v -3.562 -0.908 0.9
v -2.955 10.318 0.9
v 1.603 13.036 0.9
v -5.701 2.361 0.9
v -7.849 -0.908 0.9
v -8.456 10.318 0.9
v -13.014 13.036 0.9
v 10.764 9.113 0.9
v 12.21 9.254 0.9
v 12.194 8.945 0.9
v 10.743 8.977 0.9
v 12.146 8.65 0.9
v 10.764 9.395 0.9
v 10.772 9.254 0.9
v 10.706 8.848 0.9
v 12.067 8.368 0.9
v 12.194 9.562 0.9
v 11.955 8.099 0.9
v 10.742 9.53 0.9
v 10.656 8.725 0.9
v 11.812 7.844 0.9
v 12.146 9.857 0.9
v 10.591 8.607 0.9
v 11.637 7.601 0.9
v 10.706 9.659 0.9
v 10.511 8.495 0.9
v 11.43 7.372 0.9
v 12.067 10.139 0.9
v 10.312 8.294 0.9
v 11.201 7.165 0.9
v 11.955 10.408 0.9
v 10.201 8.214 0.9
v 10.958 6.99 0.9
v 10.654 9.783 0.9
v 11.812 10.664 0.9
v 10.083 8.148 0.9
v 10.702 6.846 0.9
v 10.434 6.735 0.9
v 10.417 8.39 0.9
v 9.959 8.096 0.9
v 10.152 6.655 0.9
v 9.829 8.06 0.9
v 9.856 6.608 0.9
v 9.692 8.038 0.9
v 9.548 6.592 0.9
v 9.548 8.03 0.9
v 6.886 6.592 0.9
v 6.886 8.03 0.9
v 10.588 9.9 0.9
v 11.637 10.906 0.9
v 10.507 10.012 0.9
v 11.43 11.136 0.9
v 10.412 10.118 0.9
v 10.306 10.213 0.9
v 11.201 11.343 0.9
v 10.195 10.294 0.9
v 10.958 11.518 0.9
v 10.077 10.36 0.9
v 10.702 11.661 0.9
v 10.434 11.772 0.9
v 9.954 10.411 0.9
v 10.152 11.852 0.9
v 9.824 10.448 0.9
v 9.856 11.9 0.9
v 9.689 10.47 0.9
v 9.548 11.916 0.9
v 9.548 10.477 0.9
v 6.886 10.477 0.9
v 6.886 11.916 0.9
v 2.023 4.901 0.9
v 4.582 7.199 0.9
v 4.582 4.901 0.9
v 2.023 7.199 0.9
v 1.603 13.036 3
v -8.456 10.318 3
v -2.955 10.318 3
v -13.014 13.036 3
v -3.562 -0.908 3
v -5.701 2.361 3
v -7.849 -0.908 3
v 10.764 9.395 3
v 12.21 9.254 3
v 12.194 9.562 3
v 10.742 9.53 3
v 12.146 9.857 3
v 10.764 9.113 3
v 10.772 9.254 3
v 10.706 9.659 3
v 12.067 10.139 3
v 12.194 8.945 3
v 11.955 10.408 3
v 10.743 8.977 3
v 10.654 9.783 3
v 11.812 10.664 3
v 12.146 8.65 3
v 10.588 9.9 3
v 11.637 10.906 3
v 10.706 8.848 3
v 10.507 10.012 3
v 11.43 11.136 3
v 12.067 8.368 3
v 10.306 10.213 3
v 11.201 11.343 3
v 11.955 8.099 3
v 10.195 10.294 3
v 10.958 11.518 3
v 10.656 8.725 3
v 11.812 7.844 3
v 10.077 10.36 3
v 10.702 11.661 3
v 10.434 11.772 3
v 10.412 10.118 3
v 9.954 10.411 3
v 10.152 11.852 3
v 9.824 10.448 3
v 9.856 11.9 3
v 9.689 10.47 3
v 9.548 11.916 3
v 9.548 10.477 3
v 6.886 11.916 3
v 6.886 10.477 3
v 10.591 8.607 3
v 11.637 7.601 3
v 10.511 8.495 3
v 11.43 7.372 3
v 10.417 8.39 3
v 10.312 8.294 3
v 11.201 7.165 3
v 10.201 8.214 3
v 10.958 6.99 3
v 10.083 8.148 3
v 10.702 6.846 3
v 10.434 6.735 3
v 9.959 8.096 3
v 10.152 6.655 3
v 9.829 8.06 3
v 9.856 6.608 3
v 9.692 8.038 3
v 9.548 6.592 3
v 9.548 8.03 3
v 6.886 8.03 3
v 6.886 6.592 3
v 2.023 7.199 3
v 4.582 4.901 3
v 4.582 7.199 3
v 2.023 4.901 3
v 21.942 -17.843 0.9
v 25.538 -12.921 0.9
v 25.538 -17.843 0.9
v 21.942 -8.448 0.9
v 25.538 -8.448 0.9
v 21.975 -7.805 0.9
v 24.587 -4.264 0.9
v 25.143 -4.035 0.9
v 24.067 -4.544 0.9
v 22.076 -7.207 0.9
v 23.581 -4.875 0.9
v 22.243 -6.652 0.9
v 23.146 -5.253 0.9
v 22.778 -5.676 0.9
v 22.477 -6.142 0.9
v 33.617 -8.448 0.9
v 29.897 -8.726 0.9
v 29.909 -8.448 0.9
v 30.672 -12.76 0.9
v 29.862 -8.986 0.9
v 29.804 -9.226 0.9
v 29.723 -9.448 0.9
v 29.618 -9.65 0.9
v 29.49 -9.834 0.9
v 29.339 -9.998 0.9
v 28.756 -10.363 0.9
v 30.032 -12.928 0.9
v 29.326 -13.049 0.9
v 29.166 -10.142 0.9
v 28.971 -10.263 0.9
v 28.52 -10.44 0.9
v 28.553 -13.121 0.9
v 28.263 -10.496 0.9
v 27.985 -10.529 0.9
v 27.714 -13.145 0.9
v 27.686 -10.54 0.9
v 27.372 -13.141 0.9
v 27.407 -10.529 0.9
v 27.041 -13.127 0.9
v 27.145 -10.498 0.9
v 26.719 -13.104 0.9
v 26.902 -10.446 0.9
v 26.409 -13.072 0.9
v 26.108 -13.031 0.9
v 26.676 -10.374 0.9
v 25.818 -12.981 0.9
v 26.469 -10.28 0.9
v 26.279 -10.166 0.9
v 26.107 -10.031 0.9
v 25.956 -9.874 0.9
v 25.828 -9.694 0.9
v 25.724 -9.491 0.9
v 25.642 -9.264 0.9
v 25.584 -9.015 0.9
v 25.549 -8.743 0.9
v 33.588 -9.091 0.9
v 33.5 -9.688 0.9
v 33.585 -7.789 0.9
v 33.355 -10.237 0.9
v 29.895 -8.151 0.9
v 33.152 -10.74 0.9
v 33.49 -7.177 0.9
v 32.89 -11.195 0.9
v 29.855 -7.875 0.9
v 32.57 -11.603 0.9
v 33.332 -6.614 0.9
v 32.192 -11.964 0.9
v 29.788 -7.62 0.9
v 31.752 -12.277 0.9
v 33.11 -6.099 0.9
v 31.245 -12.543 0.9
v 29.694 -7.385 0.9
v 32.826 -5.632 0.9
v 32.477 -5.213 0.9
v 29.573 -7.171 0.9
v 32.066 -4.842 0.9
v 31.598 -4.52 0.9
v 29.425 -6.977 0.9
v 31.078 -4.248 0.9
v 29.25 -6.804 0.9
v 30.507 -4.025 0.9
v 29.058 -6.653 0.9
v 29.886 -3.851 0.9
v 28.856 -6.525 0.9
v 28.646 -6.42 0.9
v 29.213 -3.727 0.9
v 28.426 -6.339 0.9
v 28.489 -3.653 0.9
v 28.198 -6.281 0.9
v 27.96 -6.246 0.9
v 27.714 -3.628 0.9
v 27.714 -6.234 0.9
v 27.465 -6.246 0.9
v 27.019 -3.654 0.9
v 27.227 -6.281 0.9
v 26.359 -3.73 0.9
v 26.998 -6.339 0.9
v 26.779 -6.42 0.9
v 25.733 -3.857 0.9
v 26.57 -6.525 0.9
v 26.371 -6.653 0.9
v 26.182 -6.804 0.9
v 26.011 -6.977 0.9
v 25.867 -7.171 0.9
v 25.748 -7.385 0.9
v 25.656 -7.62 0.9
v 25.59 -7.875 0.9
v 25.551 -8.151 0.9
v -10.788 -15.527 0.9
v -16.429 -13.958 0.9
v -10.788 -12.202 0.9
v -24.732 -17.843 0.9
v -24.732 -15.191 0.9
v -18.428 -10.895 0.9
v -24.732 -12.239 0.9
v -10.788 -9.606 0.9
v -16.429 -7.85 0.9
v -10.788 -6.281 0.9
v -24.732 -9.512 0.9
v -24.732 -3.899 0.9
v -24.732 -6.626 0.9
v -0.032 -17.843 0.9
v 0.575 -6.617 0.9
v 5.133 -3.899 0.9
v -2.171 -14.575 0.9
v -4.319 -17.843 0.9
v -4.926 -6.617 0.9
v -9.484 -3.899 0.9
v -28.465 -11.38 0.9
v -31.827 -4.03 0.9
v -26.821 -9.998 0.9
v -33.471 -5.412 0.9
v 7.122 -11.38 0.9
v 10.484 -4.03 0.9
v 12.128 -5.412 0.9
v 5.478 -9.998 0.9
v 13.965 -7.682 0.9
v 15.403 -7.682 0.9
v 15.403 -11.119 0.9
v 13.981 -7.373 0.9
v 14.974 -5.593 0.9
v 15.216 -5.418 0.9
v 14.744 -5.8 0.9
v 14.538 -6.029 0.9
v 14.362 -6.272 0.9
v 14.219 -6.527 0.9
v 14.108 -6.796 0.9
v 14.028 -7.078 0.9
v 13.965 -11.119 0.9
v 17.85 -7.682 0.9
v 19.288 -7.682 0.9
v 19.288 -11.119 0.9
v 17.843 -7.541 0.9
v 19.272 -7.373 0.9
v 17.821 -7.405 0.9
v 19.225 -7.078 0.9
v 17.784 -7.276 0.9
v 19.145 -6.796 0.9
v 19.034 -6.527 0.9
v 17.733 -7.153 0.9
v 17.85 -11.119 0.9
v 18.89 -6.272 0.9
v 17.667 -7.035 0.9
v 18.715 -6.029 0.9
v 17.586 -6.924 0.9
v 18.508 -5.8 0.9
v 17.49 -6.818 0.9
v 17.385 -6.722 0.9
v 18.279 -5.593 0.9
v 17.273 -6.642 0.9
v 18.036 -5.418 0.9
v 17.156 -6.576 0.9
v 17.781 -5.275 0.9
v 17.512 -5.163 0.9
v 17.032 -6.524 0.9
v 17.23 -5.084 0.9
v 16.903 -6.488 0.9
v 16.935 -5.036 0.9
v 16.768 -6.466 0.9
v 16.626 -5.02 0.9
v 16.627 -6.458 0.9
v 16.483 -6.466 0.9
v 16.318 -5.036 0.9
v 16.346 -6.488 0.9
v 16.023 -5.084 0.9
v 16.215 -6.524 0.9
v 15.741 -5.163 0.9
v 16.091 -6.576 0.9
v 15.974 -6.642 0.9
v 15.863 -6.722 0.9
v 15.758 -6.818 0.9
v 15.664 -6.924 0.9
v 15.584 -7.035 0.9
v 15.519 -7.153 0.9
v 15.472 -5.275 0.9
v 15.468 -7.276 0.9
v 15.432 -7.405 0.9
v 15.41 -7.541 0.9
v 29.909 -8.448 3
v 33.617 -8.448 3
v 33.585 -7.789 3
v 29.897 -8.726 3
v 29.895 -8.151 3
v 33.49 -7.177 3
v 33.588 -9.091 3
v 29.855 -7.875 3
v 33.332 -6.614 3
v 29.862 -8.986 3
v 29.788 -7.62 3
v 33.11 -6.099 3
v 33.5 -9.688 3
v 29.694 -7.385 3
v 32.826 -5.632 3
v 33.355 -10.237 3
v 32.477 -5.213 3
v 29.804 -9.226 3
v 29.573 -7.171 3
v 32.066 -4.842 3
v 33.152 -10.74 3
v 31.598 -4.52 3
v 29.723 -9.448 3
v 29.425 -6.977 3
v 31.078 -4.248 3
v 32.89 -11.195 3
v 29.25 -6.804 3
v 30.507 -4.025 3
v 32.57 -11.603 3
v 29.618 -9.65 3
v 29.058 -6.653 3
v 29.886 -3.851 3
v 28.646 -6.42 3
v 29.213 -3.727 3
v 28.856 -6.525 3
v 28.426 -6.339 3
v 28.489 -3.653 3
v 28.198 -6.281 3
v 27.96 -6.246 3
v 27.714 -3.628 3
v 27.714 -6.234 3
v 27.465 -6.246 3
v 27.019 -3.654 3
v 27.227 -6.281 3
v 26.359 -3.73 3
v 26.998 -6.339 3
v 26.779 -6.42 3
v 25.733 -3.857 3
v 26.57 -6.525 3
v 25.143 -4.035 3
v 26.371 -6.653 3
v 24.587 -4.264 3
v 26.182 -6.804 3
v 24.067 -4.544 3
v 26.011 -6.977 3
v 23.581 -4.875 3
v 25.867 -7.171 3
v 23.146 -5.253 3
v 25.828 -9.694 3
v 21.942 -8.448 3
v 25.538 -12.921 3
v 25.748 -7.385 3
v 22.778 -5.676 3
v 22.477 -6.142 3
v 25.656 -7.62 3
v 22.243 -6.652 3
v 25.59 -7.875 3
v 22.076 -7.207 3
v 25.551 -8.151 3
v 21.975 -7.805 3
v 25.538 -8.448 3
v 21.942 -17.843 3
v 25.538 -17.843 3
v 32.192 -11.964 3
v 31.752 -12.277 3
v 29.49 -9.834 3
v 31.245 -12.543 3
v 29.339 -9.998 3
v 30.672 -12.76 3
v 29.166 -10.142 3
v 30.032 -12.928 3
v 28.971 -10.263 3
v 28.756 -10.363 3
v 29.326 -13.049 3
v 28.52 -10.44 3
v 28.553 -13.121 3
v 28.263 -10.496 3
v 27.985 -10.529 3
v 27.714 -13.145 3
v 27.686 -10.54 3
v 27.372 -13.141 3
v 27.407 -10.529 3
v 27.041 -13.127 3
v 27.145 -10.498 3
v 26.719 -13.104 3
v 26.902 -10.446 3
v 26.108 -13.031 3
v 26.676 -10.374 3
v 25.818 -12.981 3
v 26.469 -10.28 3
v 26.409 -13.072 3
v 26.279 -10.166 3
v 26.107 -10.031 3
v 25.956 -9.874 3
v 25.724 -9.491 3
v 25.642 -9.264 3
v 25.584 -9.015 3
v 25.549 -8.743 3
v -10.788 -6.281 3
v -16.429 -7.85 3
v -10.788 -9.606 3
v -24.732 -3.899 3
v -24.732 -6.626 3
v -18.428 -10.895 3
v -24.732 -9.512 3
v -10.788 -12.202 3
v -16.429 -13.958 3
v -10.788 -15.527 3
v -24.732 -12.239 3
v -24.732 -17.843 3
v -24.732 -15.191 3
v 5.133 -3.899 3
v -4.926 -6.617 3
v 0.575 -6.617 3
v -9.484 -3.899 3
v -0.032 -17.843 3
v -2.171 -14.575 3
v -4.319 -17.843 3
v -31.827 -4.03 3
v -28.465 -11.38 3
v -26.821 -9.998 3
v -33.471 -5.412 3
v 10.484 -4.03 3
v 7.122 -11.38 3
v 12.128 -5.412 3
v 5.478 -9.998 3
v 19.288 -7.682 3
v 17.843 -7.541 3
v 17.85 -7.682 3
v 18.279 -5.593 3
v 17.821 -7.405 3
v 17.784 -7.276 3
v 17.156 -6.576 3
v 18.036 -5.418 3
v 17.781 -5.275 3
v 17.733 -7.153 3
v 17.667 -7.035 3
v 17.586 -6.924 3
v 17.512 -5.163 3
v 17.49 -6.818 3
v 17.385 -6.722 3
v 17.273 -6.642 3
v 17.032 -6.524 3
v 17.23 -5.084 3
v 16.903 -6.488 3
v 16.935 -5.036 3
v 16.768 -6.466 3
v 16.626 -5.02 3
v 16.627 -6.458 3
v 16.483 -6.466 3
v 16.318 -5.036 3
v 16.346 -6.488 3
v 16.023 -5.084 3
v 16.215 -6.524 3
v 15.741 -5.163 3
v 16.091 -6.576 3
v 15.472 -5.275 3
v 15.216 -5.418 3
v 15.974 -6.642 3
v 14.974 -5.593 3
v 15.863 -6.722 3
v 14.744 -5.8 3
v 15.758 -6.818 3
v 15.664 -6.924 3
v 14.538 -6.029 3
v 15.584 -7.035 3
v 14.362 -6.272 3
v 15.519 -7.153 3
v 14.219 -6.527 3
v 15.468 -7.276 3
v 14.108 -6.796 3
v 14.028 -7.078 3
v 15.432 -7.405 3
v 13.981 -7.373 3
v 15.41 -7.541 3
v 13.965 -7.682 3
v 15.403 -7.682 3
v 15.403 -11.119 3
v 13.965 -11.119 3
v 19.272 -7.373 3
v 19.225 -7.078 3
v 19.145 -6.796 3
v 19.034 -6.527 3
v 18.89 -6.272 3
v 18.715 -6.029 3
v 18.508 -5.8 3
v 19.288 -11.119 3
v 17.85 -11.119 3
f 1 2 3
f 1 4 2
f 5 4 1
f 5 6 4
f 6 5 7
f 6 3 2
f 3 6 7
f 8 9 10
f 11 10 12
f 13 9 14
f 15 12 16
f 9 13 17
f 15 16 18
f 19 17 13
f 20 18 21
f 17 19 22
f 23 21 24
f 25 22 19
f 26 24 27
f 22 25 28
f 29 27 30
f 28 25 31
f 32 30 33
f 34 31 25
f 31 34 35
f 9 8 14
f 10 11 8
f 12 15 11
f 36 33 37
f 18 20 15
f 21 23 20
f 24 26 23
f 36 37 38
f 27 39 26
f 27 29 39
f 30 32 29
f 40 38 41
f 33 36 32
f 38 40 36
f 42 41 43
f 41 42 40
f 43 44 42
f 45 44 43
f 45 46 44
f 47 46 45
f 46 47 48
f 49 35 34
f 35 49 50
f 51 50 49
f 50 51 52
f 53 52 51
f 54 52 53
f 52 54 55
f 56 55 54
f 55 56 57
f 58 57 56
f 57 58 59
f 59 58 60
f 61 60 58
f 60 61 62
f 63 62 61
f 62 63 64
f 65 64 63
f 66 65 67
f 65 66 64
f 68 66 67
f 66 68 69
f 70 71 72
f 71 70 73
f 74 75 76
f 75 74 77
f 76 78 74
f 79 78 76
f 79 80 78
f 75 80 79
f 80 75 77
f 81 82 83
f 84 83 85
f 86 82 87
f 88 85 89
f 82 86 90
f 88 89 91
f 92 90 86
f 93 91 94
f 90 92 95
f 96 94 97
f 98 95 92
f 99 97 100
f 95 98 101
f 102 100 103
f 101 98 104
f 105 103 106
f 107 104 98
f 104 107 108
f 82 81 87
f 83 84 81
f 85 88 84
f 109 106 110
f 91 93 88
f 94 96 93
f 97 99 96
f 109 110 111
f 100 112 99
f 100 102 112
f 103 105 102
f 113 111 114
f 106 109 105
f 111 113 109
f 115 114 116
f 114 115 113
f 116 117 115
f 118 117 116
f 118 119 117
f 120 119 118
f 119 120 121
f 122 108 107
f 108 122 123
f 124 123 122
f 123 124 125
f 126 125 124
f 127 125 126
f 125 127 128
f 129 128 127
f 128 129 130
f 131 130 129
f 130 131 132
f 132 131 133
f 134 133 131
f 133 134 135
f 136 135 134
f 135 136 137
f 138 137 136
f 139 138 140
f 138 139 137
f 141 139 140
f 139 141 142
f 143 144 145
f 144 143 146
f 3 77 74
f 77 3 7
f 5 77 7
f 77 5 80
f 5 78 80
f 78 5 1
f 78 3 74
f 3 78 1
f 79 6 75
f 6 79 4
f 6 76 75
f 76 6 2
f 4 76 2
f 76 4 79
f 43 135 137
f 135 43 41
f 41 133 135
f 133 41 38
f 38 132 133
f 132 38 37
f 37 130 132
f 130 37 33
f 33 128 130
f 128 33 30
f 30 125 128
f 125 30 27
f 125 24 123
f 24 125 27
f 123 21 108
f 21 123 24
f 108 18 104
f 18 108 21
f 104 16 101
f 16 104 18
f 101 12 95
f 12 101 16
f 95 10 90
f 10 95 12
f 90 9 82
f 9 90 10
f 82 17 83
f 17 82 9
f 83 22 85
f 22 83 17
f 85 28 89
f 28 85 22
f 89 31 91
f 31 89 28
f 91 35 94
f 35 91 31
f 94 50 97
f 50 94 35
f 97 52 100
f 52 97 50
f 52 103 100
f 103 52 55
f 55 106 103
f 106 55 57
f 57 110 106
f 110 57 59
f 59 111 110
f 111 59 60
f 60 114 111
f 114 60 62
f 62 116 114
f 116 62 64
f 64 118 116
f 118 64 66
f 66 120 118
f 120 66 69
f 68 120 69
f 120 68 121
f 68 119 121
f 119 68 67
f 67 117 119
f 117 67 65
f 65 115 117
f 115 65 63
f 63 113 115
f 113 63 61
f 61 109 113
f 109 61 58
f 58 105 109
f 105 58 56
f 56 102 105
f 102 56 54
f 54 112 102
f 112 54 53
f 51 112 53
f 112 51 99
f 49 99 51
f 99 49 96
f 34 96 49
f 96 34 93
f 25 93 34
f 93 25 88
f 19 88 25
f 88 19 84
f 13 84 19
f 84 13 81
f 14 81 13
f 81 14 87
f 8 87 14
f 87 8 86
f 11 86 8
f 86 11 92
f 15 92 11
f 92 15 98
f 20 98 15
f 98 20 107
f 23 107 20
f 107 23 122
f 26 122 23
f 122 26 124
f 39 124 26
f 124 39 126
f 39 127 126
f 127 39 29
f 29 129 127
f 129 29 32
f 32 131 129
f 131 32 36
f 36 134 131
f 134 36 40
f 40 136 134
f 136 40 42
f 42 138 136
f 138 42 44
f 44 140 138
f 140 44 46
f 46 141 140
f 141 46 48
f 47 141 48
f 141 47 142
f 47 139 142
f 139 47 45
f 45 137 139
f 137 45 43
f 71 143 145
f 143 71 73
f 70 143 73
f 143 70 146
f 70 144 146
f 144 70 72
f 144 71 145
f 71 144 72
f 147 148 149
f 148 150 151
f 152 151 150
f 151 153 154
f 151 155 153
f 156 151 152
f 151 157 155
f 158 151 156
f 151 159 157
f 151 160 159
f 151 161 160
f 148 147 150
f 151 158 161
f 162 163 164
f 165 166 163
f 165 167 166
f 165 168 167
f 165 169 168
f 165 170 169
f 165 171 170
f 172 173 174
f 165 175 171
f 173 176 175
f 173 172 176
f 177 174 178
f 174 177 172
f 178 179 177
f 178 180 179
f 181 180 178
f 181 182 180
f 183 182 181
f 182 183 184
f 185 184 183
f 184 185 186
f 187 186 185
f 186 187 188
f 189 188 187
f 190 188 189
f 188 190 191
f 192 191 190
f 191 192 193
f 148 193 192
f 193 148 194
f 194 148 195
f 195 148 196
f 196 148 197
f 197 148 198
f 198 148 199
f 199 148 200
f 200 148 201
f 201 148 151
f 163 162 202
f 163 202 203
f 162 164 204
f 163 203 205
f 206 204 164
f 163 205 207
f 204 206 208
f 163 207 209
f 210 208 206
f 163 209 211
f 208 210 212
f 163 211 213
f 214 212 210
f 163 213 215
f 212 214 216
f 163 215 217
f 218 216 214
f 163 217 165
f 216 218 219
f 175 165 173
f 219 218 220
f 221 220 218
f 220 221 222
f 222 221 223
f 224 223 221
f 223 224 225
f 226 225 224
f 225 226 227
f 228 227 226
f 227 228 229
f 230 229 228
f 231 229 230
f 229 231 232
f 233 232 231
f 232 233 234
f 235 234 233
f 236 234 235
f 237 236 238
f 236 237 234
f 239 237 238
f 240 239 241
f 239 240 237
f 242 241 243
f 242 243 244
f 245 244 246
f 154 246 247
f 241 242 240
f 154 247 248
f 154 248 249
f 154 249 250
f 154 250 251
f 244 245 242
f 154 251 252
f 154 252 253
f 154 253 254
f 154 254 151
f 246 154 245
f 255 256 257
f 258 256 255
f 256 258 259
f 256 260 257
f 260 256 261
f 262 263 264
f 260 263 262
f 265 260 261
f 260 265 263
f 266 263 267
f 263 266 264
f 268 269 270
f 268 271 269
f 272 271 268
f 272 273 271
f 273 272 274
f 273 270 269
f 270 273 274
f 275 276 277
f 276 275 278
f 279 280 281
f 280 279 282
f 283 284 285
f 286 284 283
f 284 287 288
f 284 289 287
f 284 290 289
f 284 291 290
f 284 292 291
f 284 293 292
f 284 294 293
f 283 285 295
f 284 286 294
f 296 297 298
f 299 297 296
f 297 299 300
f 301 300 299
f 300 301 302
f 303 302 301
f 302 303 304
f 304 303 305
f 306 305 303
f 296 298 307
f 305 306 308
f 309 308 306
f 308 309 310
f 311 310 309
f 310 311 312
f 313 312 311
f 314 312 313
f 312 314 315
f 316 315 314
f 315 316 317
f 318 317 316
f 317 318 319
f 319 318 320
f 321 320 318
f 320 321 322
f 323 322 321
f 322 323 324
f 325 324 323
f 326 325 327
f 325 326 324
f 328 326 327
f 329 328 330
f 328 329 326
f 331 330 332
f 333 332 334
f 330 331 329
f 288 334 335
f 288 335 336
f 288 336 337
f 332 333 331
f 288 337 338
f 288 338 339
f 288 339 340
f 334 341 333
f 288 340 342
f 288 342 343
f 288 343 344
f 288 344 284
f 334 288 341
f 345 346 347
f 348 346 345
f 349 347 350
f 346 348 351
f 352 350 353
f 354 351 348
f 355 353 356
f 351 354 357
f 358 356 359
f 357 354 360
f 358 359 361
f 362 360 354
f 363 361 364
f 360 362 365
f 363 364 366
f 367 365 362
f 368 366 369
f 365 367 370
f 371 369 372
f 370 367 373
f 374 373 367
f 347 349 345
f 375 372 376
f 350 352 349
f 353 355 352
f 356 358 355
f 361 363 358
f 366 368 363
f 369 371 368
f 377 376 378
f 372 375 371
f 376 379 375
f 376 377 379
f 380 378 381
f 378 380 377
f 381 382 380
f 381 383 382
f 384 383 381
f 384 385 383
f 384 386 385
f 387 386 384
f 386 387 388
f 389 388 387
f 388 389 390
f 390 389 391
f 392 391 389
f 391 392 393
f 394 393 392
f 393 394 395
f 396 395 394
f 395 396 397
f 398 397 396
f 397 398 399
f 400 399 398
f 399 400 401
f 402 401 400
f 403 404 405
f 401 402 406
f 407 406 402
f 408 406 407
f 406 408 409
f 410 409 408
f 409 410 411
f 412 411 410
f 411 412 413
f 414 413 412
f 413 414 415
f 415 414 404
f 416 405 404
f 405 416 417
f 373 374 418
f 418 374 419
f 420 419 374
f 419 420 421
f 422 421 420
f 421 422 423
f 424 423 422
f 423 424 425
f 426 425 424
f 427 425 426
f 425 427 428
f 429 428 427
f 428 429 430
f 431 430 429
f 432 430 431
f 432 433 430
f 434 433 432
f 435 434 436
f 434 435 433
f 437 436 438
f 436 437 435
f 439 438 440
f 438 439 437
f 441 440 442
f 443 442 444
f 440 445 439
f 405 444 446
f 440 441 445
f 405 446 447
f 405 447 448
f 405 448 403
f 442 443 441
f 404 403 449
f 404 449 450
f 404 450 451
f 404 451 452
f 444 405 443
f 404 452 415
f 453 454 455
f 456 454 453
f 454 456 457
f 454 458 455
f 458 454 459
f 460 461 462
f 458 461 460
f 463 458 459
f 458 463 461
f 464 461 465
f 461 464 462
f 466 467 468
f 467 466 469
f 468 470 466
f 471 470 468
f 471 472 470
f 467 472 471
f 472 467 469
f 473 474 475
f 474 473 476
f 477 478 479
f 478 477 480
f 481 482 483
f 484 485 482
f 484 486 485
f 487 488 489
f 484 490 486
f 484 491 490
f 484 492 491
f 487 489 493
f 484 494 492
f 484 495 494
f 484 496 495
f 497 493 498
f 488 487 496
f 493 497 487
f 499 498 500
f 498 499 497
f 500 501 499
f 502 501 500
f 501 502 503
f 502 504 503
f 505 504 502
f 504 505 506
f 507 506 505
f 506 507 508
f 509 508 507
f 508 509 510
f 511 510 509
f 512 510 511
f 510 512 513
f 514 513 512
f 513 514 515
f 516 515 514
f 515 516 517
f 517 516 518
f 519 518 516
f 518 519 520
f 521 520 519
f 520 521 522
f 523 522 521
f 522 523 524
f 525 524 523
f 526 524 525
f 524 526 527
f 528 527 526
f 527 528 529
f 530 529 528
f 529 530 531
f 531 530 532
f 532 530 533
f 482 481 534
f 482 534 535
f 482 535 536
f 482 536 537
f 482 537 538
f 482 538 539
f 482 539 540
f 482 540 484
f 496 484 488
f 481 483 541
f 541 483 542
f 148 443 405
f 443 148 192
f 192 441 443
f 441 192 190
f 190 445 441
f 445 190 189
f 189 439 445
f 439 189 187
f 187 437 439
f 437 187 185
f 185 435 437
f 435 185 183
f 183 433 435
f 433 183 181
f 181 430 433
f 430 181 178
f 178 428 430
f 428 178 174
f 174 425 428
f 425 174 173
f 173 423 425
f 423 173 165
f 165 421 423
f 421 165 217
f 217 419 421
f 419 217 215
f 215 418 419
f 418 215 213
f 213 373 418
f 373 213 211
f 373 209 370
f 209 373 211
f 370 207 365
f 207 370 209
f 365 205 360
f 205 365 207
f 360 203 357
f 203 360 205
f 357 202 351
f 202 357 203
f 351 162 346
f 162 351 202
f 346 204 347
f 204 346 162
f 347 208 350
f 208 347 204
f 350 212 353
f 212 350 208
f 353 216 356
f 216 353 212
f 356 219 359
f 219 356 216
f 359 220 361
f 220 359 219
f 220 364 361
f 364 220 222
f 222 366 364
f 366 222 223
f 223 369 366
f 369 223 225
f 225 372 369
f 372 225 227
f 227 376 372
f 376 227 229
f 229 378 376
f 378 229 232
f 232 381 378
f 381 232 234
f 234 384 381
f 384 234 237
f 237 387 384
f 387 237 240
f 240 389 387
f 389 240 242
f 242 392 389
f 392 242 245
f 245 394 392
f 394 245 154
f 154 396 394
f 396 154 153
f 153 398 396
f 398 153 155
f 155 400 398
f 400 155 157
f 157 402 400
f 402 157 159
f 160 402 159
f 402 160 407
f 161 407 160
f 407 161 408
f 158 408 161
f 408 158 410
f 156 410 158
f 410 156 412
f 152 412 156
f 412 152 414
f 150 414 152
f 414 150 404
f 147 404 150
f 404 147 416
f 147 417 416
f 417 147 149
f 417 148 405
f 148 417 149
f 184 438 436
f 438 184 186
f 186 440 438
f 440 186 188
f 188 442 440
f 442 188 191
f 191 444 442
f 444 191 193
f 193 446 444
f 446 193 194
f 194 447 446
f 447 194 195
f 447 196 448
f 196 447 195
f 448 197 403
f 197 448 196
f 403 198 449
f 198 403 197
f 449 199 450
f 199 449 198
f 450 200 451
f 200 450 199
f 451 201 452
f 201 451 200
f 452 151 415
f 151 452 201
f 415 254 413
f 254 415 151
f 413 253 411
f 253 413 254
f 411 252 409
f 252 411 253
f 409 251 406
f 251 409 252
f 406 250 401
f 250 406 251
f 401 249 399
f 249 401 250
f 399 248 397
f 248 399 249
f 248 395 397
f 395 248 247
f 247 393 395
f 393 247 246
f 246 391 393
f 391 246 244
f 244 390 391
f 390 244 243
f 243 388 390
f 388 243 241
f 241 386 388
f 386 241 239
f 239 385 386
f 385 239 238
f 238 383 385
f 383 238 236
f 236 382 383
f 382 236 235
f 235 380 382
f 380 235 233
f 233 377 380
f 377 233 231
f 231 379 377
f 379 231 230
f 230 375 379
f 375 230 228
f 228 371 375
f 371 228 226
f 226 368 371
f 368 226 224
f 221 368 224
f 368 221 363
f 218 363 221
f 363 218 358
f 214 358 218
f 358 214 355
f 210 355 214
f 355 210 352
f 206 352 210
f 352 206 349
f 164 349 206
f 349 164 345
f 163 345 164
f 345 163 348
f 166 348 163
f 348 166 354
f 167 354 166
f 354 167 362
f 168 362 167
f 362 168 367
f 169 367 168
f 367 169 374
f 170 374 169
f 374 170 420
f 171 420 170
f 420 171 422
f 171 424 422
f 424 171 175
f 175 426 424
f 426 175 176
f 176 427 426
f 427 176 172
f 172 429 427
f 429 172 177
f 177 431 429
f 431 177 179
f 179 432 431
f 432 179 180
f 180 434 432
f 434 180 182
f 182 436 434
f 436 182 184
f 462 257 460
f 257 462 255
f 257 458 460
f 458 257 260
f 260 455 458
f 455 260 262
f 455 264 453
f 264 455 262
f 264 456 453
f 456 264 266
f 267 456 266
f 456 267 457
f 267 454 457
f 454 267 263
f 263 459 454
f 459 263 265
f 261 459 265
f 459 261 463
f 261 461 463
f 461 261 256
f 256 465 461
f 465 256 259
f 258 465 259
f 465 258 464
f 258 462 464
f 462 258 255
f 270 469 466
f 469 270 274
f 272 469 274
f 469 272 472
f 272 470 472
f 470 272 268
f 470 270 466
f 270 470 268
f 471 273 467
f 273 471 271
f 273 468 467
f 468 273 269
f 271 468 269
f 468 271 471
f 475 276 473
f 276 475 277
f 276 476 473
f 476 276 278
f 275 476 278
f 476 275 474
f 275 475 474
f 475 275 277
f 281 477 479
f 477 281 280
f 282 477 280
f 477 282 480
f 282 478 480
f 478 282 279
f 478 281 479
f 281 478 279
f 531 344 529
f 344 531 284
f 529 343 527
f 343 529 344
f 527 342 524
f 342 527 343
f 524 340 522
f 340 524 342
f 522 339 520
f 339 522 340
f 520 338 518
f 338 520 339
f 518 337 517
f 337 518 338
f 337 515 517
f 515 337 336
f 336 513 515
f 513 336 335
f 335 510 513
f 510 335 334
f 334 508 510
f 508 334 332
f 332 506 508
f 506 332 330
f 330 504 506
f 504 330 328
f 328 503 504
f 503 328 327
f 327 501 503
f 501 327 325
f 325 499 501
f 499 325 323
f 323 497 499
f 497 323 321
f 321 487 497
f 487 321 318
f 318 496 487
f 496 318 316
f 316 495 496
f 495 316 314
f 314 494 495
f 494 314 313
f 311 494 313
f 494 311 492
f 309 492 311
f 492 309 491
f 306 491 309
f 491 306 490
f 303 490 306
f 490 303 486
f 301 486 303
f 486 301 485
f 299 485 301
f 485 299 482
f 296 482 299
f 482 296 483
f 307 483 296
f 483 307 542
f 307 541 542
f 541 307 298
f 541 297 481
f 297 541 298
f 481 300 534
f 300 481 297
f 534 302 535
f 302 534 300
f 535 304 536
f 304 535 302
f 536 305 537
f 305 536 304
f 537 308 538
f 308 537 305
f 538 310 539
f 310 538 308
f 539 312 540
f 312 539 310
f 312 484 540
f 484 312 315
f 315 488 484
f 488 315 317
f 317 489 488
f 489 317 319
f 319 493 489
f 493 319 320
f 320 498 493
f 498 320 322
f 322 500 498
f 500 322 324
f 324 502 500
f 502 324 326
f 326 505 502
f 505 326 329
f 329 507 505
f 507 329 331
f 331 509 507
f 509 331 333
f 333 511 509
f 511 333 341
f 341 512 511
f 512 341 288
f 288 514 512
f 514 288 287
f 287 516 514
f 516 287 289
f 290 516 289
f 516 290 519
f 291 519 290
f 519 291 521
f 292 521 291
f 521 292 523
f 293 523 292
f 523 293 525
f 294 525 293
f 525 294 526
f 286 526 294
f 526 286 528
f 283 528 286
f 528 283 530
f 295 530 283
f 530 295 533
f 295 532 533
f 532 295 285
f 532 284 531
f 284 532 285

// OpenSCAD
$fn = 48;
  // syllabics (overlaid on icon, tallest)
  translate([0, 5.901, 0.900]) linear_extrude(height=2.100) text("ᐍᐣ", size=13.773, halign="center", valign="center", font="Euphemia UCAS:style=Bold");
  translate([0, -10.901, 0.900]) linear_extrude(height=2.100) text("ᐠᕒᐁᐟᐢᑭ", size=13.773, halign="center", valign="center", font="Euphemia UCAS:style=Bold");
